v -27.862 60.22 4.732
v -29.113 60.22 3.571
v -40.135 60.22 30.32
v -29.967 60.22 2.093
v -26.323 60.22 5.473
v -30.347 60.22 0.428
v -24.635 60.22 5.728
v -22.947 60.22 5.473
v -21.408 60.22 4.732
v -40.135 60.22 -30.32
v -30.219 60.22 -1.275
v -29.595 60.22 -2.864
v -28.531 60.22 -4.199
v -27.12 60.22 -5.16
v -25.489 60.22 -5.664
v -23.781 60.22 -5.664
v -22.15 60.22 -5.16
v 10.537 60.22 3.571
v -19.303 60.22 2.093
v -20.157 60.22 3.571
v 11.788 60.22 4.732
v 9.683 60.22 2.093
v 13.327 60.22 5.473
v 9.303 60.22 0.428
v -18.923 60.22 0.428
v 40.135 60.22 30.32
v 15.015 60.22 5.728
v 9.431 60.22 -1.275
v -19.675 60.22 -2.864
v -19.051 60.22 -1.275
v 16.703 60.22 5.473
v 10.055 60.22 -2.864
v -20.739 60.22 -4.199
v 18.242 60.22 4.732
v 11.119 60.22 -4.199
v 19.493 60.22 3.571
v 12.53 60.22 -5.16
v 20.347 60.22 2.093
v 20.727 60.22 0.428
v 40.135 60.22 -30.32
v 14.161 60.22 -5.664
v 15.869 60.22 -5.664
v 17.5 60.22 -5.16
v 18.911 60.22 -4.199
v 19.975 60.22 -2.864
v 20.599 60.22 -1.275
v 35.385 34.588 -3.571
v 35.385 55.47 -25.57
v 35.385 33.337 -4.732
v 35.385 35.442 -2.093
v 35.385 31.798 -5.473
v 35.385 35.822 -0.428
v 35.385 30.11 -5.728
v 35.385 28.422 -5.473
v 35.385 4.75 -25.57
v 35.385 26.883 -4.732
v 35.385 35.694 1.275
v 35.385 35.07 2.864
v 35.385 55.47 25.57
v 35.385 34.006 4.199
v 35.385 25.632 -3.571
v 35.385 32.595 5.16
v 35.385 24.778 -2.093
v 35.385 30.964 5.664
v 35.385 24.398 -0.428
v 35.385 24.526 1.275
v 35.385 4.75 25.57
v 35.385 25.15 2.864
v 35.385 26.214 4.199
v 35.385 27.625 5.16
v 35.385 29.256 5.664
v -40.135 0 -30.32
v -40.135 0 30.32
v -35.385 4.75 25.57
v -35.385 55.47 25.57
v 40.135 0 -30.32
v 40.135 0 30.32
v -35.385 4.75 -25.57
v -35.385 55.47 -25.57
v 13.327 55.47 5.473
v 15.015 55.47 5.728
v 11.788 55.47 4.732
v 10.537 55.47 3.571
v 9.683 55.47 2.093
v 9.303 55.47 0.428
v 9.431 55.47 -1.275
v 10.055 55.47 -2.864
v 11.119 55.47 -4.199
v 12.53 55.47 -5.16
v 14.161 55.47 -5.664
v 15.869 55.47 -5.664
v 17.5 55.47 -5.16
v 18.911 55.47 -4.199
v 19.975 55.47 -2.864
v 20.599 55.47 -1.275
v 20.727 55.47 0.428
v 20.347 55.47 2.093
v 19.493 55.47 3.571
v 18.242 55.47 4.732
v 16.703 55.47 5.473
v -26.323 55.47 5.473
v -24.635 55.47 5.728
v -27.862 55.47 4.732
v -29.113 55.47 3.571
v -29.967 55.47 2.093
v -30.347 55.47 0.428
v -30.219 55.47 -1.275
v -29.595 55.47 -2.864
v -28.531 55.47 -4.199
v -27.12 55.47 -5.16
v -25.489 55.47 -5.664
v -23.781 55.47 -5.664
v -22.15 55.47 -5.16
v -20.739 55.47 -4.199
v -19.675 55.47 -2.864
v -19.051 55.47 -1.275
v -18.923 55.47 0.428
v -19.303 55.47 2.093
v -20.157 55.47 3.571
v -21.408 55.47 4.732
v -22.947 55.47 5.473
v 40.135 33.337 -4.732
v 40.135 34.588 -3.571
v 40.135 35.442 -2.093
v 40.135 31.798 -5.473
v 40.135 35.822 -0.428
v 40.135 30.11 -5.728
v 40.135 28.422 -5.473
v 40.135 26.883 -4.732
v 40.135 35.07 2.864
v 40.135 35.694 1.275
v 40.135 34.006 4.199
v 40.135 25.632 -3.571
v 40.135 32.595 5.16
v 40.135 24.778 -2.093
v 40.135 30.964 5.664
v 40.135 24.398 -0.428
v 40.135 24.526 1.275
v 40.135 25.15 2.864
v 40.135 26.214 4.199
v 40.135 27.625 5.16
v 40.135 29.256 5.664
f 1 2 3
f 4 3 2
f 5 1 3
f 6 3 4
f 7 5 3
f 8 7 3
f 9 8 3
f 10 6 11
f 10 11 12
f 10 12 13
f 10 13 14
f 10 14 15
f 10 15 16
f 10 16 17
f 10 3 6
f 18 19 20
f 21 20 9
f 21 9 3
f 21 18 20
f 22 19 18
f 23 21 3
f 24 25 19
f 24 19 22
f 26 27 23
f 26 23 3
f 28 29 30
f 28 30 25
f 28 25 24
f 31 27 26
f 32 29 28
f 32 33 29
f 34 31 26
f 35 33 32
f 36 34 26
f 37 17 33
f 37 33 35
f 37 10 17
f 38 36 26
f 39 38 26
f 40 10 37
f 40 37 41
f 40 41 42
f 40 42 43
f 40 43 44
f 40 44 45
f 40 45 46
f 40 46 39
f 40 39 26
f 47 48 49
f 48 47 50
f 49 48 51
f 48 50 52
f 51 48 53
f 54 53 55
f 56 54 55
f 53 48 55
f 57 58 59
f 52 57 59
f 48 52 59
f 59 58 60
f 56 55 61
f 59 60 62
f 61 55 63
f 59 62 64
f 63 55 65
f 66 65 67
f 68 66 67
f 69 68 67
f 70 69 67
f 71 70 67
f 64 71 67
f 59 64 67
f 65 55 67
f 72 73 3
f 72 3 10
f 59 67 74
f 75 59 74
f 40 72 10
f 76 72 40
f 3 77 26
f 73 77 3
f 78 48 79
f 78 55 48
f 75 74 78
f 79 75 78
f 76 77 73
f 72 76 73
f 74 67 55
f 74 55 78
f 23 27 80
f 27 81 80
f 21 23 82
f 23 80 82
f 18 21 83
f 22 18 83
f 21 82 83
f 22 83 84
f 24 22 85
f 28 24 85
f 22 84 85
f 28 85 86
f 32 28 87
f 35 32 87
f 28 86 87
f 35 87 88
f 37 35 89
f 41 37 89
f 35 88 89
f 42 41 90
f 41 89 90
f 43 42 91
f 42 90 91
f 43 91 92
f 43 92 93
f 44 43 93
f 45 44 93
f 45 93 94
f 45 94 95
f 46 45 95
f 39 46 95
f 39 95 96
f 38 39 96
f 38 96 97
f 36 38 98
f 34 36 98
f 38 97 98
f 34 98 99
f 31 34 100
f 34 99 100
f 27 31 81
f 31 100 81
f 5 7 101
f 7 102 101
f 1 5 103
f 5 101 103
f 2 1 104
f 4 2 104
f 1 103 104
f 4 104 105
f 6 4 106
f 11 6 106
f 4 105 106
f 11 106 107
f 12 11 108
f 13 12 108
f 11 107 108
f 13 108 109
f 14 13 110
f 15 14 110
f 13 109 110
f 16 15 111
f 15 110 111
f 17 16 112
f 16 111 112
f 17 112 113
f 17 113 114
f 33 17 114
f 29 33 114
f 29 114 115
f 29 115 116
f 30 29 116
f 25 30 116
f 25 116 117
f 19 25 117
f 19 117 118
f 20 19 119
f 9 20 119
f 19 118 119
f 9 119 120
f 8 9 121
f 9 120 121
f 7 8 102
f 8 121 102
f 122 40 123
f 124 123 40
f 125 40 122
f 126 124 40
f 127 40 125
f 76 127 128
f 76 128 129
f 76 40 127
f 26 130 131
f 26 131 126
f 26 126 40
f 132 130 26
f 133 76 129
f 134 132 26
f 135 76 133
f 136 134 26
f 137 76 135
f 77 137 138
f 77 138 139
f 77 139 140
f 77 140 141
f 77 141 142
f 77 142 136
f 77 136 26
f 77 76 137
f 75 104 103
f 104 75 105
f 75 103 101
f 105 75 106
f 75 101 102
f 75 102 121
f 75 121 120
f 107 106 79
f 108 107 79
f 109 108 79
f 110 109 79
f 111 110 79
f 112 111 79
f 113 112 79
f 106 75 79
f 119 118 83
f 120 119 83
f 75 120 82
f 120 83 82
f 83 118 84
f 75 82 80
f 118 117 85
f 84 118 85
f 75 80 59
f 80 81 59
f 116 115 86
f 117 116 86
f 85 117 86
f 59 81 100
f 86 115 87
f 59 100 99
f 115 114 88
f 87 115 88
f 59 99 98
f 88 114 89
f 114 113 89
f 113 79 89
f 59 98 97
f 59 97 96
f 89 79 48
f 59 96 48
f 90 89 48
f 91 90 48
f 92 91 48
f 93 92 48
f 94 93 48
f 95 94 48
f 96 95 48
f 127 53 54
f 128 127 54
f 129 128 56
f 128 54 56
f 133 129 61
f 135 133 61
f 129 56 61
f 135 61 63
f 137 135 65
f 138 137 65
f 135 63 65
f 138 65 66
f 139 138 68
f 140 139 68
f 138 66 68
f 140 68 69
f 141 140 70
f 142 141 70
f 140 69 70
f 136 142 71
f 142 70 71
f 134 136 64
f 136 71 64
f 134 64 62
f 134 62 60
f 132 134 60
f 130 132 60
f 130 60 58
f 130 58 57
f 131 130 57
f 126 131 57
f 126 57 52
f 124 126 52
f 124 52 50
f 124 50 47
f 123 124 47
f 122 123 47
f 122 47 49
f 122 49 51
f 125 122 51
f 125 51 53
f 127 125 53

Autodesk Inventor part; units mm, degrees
ref_plane "YZ Plane" through (0, 0, 0) normal (1, 0, 0) x (0, 1, 0)
ref_plane "XZ Plane" through (0, 0, 0) normal (0, 1, 0) x (-1, 0, 0)
ref_plane "XY Plane" through (0, 0, 0) normal (0, 0, 1) x (1, 0, 0)
sketch "Sketch1" plane through (0, 0, 0) normal (0, 1, 0) x (-1, 0, 0)
  line L0 (-40.135, 30.32) -> (40.135, 30.32)
  line L1 (40.135, 30.32) -> (40.135, -30.32)
  line L2 (40.135, -30.32) -> (-40.135, -30.32)
  line L3 (-40.135, -30.32) -> (-40.135, 30.32)
  line L4 (-40.135, 30.32) -> (40.135, -30.32) construction
  line L5 (40.135, 30.32) -> (-40.135, -30.32) construction
  point P0 (0, 0)
  dimension "d0" = 80.27
  dimension "d1" = 60.64
extrude "Extrusion1" add sketch "Sketch1" along normal blind 4.75
sketch "Sketch2" plane through (0, 4.75, 0) normal (0, 1, 0) x (1, 0, 0)
  line L0 (-40.135, -30.32) -> (40.135, -30.32) projected
  line L1 (40.135, -30.32) -> (40.135, 30.32) projected
  line L2 (-40.135, -30.32) -> (40.135, -30.32)
  line L3 (40.135, -30.32) -> (40.135, -25.57)
  line L4 (40.135, -25.57) -> (-40.135, -25.57)
  line L5 (-40.135, -25.57) -> (-40.135, -30.32)
  line L6 (-40.135, 30.32) -> (40.135, 30.32)
  line L7 (40.135, 30.32) -> (40.135, 25.57)
  line L8 (40.135, 25.57) -> (-40.135, 25.57)
  line L9 (-40.135, 25.57) -> (-40.135, 30.32)
  line L10 (-40.135, -25.57) -> (-35.385, -25.57)
  line L11 (-35.385, -25.57) -> (-35.385, 25.57)
  line L12 (-35.385, 25.57) -> (-40.135, 25.57)
  line L13 (-40.135, 25.57) -> (-40.135, -25.57)
  line L14 (40.135, 25.57) -> (35.385, 25.57)
  line L15 (35.385, 25.57) -> (35.385, -25.57)
  line L16 (35.385, -25.57) -> (40.135, -25.57)
  line L17 (40.135, -25.57) -> (40.135, 25.57)
  point P0 (0, 0)
  dimension "d4" = 4.75
  dimension "d5" = 4.75
  dimension "d6" = 4.75
  dimension "d7" = 4.75
extrude "Extrusion2" add sketch "Sketch2" along normal blind 50.72 contours L5 L4 L1 L0 | L13 L8 L11 L4 | L4 L15 L8 L1 | L9 L6 L1 L8
sketch "Sketch3" plane through (0, 55.47, 0) normal (0, 1, 0) x (1, 0, 0)
  line L0 (40.135, -30.32) -> (-40.135, -30.32) projected
  line L1 (-40.135, -30.32) -> (-40.135, 30.32) projected
  line L2 (-40.135, 30.32) -> (40.135, 30.32) projected
  line L3 (40.135, 30.32) -> (40.135, -30.32) projected
  point P0 (0, 0)
extrude "Extrusion3" add sketch "Sketch3" along normal blind 4.75
sketch "Sketch4" plane through (40.135, 0, 30.32) normal (1, 0, 0) x (0, 0, -1)
  line L0 (0, 60.22) -> (60.64, 60.22) projected
  line L1 (0, 0) -> (0, 60.22) projected
  line L2 (60.64, 0) -> (60.64, 60.22) projected
  line L3 (60.64, 0) -> (0, 0) projected
  point P0 (30.32, 0)
  point P1 (30.32, 30.11)
hole "Hole1" at (40.135, 30.11, 0) direction (-1, 0, 0) diameter 11.4554 end up to surface
sketch "Sketch5" plane through (0, 60.22, 0) normal (0, 1, 0) x (1, 0, 0)
  line L0 (-40.135, -30.32) -> (40.135, -30.32) projected
  line L1 (40.135, -30.32) -> (40.135, 30.32) projected
  line L2 (40.135, 30.32) -> (-40.135, 30.32) projected
  line L3 (-40.135, 30.32) -> (-40.135, -30.32) projected
  point P0 (0, 0)
  point P1 (-24.635, 0)
  point P2 (15.015, 0)
  dimension "d19" = 15.5
  dimension "d20" = 25.12
hole "Hole2" at (-24.635, 60.22, 0) at (15.015, 60.22, 0) direction (0, -1, 0) diameter 11.4554 end up to surface
properties part number "Reservoir" material "PMMA Plastic"
